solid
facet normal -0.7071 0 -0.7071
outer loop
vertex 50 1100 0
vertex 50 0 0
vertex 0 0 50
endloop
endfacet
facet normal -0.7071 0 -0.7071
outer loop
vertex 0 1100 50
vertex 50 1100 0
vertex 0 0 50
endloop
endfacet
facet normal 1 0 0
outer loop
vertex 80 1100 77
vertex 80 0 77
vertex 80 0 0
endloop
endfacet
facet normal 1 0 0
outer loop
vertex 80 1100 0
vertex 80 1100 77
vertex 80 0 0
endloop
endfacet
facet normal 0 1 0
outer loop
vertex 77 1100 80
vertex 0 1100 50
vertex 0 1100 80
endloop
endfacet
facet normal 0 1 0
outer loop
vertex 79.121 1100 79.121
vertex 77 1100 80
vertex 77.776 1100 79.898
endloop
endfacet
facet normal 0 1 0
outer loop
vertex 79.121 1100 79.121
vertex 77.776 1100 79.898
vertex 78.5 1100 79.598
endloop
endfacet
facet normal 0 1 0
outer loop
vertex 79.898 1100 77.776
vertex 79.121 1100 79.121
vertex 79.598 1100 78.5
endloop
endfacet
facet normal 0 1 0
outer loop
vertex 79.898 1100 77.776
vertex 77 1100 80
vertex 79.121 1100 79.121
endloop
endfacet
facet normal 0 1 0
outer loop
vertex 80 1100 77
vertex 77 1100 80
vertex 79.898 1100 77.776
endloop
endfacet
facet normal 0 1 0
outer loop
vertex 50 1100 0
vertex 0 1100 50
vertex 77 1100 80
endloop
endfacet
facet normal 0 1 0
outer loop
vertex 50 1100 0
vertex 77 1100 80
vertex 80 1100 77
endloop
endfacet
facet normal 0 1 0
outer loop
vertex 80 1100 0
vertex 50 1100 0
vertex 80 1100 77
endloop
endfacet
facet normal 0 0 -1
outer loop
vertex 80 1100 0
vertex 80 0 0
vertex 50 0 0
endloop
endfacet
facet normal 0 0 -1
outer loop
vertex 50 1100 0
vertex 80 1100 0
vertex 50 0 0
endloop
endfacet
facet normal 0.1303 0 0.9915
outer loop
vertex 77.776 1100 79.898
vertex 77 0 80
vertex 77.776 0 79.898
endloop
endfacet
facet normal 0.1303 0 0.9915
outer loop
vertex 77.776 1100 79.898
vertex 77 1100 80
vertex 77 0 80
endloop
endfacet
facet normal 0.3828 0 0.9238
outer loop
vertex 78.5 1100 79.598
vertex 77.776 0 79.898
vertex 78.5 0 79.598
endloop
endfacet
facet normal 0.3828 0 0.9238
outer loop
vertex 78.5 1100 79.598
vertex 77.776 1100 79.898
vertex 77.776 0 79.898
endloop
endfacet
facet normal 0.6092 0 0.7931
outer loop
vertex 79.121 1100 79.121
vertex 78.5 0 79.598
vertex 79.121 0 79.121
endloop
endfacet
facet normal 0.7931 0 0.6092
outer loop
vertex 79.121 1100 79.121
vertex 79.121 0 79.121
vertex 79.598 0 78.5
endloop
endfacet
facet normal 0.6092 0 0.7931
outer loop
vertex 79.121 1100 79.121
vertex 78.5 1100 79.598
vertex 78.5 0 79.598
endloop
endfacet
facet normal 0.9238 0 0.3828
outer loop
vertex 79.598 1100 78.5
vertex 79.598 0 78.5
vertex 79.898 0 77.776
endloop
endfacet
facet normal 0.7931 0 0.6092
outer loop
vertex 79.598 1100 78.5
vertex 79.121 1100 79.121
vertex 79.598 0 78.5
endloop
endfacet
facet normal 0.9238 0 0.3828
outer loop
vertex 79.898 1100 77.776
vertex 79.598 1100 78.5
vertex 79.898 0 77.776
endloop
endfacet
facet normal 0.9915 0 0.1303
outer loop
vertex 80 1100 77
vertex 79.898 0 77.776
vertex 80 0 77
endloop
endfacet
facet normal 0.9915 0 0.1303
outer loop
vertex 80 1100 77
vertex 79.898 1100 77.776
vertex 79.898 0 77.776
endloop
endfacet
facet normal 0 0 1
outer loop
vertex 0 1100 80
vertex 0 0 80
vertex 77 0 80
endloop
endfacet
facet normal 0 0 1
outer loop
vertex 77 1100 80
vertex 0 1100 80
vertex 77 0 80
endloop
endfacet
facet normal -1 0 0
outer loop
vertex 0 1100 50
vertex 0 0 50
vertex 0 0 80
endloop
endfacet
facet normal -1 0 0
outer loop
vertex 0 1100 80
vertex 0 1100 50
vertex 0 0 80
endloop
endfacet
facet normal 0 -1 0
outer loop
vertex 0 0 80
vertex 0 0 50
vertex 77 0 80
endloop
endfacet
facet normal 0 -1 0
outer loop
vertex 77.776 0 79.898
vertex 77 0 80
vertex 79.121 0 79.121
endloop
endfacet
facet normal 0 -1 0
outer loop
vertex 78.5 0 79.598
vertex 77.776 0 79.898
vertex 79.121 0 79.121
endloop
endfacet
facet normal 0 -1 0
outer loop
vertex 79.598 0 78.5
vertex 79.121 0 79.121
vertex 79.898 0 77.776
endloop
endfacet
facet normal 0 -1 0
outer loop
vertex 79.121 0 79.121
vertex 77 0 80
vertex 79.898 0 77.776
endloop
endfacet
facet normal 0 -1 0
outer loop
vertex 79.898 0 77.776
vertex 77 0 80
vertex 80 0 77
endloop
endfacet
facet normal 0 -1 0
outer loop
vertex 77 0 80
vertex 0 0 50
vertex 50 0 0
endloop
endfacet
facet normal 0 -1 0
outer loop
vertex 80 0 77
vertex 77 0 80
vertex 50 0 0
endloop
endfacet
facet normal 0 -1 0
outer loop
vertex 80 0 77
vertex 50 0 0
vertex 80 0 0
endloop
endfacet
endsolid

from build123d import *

# Parameters (mm, degrees)
EXTRUDE_L_NGD_DEPTH = 1100
FILLET_KANTER_R     = 3


with BuildPart() as part:
    # Sketch3 → Extrude längd (new body)
    with BuildSketch(Plane(origin=(0, 0, 0), x_dir=(1, 0, 0), z_dir=(0, 1, 0))):
        Polygon((0, -80), (80, -80), (80, 0), (50, 0), (0, -50), align=None)
    extrude(amount=EXTRUDE_L_NGD_DEPTH)

    # Fillet kanter
    fillet_kanter_edges = [part.edges().sort_by_distance(p)[0] for p in [
        (80, 550, 80),
    ]]
    fillet(fillet_kanter_edges, radius=FILLET_KANTER_R)


solid = part.part
